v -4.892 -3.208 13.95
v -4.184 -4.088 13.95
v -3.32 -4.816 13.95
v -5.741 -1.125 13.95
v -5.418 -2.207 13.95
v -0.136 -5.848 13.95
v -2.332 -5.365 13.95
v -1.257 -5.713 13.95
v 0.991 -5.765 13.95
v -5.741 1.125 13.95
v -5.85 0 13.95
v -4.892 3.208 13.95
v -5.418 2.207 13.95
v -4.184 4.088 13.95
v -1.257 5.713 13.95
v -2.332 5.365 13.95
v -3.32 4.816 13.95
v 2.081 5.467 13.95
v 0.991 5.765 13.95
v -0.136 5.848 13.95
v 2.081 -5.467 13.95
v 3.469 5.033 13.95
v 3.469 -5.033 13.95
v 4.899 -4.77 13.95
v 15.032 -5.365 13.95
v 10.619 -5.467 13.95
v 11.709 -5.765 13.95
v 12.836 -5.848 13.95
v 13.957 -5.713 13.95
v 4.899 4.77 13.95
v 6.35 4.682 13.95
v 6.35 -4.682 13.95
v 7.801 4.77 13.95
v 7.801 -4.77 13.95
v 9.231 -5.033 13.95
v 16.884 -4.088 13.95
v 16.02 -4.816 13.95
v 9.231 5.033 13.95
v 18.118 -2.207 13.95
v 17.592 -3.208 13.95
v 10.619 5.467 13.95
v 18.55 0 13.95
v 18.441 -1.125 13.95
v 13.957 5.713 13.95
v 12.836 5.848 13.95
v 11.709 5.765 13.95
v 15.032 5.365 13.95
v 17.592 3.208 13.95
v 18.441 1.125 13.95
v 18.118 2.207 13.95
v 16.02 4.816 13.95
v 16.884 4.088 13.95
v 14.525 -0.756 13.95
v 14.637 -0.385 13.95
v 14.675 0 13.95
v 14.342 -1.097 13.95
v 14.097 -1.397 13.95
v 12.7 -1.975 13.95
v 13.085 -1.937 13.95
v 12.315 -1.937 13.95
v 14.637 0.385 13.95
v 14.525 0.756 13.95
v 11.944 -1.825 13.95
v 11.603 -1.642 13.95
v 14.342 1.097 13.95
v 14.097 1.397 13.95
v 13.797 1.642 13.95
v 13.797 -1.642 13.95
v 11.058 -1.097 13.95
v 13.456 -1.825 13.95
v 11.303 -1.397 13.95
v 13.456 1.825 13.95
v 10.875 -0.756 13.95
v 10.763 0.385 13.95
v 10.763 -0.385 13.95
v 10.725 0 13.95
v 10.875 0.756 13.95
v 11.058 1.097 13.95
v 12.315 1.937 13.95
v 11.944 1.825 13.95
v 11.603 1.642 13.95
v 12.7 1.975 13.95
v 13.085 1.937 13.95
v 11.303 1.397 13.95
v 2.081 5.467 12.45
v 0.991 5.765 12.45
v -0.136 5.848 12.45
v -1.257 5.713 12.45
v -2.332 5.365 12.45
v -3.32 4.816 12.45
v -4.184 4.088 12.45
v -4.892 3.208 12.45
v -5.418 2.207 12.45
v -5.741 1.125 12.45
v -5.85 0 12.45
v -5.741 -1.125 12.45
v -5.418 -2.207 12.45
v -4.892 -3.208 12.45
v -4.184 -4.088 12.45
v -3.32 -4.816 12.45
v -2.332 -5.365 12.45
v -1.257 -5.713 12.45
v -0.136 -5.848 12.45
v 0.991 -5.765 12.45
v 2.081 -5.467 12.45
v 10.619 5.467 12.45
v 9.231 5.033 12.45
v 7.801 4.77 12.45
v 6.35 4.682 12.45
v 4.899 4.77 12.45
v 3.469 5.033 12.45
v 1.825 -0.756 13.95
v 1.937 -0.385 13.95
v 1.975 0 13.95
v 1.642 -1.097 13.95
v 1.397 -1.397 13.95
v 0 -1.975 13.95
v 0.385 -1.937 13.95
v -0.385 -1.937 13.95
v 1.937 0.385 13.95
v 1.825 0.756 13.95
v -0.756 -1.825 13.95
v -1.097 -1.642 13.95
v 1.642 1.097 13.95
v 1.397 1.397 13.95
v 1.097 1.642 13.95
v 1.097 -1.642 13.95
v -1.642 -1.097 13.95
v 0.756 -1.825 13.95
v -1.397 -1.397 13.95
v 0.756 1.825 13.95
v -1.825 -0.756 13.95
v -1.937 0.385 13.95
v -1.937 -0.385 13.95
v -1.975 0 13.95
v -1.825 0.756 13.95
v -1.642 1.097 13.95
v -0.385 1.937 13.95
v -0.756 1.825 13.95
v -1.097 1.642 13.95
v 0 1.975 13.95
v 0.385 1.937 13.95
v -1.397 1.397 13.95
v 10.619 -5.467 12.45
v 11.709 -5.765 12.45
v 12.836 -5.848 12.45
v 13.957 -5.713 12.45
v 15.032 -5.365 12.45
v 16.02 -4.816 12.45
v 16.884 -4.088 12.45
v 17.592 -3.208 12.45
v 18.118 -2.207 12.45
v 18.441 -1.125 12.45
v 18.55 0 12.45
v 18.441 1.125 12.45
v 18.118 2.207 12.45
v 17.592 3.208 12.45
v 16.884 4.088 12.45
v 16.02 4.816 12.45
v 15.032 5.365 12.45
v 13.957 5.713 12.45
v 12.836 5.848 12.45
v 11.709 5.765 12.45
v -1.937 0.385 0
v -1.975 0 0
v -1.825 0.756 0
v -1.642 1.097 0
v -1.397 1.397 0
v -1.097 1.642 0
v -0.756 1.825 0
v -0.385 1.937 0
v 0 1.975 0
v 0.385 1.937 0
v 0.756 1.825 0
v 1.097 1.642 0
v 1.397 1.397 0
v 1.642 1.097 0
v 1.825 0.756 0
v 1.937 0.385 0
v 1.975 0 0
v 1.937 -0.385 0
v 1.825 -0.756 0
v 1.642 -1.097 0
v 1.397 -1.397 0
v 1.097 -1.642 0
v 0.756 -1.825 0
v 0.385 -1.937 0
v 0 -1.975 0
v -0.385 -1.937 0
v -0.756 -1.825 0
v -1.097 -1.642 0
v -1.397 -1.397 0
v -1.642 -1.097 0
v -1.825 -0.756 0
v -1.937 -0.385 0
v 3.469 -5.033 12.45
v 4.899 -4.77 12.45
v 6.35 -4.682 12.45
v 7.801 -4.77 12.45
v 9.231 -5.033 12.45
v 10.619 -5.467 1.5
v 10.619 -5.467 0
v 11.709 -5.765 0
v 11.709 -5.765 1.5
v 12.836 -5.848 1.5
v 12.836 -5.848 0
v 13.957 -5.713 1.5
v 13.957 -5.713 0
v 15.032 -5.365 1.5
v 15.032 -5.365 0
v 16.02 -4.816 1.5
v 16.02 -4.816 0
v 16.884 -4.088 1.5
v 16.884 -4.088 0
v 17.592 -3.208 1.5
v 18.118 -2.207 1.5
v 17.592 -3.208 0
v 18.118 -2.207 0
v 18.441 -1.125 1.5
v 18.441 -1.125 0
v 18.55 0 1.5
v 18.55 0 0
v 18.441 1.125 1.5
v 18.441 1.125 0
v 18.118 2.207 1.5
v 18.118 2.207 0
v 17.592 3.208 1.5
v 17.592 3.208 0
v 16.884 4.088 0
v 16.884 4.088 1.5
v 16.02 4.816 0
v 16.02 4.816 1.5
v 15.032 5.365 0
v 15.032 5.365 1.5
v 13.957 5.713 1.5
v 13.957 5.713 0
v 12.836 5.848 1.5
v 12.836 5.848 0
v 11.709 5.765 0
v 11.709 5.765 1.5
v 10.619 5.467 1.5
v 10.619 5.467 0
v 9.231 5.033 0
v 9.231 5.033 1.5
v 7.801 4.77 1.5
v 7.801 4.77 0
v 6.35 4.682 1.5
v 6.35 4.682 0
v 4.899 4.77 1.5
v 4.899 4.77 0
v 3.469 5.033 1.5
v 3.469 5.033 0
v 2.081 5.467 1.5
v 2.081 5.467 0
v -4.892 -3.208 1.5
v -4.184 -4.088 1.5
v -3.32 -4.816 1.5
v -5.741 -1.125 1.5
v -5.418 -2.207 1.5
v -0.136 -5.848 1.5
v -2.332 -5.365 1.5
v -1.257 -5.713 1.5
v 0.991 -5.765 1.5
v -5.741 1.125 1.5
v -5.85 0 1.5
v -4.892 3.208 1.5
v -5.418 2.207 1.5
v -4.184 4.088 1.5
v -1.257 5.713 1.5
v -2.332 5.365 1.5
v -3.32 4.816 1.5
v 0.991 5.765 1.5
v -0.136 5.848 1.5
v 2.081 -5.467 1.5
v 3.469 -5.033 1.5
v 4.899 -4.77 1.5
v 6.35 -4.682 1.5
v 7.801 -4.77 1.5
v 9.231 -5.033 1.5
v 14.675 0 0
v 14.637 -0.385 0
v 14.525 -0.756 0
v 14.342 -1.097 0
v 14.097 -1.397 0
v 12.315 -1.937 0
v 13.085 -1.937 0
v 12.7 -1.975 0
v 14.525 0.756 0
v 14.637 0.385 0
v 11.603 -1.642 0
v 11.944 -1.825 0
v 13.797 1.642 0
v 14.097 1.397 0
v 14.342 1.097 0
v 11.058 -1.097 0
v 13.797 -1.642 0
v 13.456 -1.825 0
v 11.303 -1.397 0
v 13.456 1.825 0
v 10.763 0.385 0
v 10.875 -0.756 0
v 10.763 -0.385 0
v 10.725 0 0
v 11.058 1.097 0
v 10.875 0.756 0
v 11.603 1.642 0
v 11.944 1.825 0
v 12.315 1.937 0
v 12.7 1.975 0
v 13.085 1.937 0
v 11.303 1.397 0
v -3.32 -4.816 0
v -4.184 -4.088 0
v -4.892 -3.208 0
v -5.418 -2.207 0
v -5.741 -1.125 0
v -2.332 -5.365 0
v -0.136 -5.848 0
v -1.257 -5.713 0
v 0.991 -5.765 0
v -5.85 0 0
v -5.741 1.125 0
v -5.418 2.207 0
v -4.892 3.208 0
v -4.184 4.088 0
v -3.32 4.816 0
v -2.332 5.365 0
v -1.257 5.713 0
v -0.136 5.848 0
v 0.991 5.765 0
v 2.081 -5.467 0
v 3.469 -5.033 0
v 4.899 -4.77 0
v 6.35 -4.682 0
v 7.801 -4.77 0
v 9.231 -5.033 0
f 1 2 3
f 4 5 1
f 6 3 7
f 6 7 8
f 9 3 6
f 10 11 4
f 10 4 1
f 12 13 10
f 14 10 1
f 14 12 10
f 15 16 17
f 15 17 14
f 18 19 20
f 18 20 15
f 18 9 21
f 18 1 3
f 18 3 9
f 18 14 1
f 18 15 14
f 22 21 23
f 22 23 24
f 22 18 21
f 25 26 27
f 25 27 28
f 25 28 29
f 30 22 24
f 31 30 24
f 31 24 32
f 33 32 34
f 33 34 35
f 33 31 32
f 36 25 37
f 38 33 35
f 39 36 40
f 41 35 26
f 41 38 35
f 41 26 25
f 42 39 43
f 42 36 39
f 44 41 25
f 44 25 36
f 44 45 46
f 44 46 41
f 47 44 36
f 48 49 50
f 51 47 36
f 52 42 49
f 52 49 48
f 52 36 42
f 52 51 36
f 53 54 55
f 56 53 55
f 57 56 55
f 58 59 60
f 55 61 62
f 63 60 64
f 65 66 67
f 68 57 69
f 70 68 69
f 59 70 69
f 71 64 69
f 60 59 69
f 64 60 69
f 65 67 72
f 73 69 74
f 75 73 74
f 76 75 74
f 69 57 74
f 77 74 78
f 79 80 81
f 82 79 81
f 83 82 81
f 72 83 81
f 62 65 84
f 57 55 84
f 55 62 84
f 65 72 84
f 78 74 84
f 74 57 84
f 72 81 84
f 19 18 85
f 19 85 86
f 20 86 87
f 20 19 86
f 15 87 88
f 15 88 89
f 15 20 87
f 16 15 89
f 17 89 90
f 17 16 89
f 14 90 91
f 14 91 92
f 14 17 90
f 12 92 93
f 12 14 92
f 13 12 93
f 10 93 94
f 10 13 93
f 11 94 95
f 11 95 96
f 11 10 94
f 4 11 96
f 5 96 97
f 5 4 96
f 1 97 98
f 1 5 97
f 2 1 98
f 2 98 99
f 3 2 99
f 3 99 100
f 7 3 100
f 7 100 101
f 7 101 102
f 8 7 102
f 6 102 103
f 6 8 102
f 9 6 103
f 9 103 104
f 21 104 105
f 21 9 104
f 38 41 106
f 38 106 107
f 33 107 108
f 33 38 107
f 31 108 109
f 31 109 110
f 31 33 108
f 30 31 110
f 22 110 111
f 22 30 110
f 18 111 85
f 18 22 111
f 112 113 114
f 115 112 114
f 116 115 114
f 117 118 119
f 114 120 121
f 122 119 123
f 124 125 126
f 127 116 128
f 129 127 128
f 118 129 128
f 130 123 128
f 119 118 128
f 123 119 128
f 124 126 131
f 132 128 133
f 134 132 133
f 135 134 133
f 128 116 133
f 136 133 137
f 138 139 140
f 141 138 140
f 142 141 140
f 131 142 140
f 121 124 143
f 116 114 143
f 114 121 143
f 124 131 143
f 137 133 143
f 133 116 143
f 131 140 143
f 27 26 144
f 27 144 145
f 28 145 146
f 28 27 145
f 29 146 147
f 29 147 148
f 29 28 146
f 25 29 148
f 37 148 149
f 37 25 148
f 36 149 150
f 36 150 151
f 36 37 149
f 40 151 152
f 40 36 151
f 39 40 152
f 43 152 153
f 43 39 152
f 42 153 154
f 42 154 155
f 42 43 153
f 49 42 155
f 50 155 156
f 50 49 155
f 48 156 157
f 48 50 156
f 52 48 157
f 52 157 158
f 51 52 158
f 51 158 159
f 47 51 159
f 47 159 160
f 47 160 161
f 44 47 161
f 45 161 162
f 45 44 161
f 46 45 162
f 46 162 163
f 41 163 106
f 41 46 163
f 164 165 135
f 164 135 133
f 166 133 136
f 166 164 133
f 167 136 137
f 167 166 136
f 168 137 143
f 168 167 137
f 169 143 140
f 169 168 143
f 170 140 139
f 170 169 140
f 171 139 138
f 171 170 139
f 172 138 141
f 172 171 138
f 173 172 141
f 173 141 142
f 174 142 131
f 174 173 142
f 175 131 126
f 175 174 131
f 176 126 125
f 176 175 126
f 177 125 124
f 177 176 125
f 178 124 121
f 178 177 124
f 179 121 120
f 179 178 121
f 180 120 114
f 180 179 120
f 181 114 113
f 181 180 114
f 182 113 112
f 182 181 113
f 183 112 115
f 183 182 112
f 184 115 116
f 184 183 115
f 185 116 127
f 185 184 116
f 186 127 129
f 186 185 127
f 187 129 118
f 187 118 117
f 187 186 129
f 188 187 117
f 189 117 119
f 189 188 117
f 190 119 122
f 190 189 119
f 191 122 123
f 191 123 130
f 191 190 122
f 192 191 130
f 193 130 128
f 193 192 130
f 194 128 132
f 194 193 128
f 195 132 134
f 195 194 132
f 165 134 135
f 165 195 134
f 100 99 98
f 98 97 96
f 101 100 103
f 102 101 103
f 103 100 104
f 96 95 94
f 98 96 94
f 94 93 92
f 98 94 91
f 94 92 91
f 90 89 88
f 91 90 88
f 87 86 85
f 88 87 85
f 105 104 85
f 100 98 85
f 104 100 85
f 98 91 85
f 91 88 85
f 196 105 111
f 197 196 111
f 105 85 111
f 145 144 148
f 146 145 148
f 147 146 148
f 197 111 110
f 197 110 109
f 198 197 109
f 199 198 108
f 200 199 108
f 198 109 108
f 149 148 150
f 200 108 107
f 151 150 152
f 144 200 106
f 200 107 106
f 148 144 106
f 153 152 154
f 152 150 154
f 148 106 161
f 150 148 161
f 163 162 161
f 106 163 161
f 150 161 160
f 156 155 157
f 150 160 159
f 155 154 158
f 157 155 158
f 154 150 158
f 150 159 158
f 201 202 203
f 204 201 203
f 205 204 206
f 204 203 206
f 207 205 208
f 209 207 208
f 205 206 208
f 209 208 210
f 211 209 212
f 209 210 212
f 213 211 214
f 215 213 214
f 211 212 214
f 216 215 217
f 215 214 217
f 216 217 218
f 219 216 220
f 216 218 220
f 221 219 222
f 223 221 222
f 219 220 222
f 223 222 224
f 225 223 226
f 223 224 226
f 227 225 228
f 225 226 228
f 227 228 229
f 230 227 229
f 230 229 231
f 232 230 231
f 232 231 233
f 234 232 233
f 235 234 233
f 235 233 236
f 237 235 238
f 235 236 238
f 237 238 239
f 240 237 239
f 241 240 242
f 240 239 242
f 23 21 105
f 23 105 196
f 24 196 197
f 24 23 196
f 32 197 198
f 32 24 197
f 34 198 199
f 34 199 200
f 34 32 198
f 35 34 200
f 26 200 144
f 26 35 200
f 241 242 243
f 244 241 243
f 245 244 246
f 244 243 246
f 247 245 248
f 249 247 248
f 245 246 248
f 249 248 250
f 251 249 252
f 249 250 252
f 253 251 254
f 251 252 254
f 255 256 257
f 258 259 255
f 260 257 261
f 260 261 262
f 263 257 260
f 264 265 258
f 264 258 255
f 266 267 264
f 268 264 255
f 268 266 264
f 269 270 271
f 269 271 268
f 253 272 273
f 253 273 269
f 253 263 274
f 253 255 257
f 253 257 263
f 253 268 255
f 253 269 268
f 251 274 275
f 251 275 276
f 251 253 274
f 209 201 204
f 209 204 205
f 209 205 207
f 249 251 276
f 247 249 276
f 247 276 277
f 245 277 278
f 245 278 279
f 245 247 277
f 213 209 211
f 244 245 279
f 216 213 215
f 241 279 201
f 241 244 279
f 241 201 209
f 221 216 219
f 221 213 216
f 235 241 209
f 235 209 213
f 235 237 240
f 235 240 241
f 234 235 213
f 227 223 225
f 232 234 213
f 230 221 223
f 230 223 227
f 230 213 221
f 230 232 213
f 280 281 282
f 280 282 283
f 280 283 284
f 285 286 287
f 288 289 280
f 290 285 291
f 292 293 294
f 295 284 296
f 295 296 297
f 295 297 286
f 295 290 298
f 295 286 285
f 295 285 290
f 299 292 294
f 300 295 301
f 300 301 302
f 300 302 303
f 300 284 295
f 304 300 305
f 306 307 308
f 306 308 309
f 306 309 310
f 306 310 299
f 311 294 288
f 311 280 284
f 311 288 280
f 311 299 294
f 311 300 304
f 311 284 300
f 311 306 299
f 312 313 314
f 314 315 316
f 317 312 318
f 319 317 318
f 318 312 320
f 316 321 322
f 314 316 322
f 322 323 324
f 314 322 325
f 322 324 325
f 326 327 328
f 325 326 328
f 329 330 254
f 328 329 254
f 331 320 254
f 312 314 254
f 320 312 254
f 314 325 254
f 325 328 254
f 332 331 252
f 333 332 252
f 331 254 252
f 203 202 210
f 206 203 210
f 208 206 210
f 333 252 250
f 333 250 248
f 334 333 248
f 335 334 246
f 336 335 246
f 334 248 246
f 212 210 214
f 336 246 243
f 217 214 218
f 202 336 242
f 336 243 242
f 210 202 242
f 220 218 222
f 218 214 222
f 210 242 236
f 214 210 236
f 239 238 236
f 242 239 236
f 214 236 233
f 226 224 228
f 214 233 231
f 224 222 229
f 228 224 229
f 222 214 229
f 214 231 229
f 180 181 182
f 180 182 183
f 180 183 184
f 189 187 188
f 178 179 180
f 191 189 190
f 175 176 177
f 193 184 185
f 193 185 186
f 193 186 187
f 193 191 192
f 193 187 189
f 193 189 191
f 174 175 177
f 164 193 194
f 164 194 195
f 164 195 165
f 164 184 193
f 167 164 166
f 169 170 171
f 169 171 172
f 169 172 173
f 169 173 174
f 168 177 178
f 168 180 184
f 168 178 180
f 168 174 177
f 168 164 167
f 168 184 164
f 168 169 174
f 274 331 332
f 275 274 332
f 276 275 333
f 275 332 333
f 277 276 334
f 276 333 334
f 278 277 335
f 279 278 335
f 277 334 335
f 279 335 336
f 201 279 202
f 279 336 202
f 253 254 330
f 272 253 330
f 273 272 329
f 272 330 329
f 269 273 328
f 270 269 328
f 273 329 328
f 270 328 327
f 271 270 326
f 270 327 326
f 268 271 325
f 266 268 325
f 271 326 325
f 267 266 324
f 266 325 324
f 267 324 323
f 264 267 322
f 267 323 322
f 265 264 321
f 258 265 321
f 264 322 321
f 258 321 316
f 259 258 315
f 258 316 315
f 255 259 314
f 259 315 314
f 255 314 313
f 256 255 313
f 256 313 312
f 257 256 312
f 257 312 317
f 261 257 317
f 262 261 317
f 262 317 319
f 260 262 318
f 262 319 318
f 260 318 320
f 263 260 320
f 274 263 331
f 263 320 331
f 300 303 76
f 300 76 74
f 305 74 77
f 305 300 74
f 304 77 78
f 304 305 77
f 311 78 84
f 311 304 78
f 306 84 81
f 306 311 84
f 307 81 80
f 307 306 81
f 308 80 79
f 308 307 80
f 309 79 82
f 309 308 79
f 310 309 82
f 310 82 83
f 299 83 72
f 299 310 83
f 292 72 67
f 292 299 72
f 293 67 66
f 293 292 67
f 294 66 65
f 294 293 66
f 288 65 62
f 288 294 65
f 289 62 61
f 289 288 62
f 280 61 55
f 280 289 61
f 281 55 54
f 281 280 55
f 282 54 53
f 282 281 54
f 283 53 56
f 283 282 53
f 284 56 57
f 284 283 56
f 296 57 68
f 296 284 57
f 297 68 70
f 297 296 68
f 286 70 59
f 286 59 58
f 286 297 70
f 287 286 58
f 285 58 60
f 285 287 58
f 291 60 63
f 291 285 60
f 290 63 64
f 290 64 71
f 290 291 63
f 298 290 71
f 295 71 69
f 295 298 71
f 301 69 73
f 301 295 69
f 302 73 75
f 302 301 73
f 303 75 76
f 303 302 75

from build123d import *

# Parameters (mm, degrees)
BOSS_EXTRUDE1_DEPTH   = 1.5
SKETCH3_R             = 1.975
BOSS_EXTRUDE2_DEPTH   = 13.95
BOSS_EXTRUDE2_2_DEPTH = 13.95


with BuildPart() as part:
    # Sketch1 → Boss-Extrude1 (new body)
    with BuildSketch(Plane.XY):
        with BuildLine():
            ThreePointArc((2.081092437, 5.467316917), (-5.85, 0), (2.081092437, -5.467316917))
            ThreePointArc((2.081092437, -5.467316917), (6.35, -4.682325977), (10.618907563, -5.467316917))
            ThreePointArc((10.618907563, -5.467316917), (18.55, 0), (10.618907563, 5.467316917))
            ThreePointArc((10.618907563, 5.467316917), (6.35, 4.682325977), (2.081092437, 5.467316917))
        make_face()
    extrude(amount=BOSS_EXTRUDE1_DEPTH)


with BuildPart() as body_2:
    # Mirror2: mirrored copy
    add(part.part.mirror(Plane.XY.offset(6.975)))


with BuildPart() as body_3:
    # Sketch3 → Boss-Extrude2 (new body)
    with BuildSketch(Plane(origin=(0, 0, 0), x_dir=(-1, 0, 0), z_dir=(0, 0, -1))):
        Circle(SKETCH3_R)
    extrude(amount=-BOSS_EXTRUDE2_DEPTH)


with BuildPart() as body_4:
    # Sketch3 → Boss-Extrude2 2 (new body)
    with BuildSketch(Plane(origin=(0, 0, 0), x_dir=(-1, 0, 0), z_dir=(0, 0, -1))):
        with Locations((-12.7, 0)):
            Circle(SKETCH3_R)
    extrude(amount=-BOSS_EXTRUDE2_2_DEPTH)


solid = Compound([part.part, body_2.part, body_3.part, body_4.part])
